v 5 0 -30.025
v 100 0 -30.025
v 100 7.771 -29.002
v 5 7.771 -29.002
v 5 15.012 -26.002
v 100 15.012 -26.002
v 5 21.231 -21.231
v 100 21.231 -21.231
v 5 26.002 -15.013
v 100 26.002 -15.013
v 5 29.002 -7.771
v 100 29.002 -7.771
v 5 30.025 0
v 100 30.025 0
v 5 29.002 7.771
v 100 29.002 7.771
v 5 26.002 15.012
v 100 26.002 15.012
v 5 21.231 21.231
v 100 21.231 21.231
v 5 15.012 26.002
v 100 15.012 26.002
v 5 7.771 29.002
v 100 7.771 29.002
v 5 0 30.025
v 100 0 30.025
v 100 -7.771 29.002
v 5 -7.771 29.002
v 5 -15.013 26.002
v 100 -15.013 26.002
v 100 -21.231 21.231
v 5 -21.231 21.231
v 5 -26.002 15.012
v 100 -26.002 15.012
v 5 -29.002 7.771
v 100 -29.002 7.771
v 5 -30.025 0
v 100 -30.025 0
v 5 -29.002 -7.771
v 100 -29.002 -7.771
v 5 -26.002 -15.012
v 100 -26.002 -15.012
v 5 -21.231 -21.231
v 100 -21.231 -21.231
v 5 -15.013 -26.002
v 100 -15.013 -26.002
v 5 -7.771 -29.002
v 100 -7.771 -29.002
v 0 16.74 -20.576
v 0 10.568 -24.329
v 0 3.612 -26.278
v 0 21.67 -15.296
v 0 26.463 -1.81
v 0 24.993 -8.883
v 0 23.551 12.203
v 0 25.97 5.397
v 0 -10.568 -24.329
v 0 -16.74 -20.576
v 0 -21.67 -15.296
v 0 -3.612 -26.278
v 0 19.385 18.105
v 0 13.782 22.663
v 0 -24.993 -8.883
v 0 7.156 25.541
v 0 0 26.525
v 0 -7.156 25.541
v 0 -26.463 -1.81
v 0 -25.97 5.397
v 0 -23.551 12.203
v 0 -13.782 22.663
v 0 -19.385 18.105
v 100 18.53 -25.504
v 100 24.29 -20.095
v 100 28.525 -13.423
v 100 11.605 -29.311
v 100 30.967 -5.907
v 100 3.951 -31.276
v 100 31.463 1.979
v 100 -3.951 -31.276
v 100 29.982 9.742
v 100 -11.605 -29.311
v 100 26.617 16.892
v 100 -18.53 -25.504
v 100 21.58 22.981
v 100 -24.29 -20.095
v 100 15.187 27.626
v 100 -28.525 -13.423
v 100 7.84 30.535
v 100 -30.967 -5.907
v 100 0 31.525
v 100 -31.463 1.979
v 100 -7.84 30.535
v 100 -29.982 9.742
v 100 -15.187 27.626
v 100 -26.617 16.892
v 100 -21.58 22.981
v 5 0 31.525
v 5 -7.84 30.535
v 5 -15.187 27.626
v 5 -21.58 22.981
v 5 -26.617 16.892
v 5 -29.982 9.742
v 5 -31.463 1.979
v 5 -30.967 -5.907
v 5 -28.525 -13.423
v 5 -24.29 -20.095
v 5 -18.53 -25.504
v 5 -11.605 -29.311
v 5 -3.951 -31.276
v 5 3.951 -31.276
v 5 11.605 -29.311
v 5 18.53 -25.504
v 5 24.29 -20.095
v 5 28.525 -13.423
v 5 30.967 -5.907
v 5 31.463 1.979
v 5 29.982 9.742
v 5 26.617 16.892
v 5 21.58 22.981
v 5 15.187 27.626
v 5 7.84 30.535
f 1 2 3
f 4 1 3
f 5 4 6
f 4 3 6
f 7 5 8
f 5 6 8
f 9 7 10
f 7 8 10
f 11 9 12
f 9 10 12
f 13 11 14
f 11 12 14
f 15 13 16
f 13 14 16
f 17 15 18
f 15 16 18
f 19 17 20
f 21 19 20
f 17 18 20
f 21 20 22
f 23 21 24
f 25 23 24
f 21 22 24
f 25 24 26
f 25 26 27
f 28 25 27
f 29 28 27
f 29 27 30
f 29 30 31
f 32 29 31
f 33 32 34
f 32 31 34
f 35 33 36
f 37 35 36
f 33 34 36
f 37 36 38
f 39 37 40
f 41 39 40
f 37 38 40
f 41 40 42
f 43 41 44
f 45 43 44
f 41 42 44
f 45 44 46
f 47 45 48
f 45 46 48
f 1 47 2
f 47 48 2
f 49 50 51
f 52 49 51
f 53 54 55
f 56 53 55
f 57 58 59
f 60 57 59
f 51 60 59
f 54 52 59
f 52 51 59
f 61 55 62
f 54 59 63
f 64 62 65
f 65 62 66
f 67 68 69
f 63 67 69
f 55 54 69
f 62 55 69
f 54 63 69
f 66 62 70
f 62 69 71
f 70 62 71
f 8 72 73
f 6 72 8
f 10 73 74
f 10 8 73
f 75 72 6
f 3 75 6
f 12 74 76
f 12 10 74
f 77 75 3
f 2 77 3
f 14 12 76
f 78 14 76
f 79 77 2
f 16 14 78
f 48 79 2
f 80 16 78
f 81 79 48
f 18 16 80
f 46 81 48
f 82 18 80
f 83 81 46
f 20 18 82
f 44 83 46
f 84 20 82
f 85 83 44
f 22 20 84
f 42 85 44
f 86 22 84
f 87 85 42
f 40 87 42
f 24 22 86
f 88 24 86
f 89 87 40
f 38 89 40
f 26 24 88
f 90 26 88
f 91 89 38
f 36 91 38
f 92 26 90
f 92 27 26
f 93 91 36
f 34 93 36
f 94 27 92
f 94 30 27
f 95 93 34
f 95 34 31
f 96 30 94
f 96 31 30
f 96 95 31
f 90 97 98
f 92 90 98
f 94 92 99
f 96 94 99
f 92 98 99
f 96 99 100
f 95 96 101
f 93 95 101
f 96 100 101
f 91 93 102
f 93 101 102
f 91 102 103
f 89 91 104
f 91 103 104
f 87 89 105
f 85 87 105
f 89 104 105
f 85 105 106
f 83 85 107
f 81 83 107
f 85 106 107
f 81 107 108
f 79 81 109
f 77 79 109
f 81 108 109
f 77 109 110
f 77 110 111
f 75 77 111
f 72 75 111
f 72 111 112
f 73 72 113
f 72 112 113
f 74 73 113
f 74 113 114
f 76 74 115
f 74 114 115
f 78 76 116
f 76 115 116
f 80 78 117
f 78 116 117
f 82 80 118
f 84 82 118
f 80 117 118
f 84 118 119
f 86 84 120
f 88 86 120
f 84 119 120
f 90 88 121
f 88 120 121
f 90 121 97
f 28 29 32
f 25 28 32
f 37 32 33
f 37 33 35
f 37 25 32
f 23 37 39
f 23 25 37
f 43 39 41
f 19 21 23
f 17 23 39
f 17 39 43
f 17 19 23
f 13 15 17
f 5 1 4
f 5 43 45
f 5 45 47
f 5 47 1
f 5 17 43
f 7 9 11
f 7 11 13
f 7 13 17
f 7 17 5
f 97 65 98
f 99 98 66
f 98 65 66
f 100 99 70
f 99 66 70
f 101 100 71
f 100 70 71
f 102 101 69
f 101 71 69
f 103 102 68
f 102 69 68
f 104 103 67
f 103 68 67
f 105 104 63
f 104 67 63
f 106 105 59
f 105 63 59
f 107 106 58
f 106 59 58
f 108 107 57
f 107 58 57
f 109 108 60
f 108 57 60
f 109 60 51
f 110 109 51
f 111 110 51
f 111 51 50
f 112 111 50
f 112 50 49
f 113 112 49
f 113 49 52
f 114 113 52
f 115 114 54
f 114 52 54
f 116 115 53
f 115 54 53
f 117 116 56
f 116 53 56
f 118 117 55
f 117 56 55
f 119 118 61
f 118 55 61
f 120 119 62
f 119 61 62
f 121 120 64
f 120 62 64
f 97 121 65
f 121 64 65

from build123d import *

# Parameters (mm, degrees)
SKETCH1_R           = 31.525
BOSS_EXTRUDE1_DEPTH = 100
SKETCH3_R           = 30.025
CUT_EXTRUDE1_DEPTH  = 95
CHAMFER2_SIZE       = 5


with BuildPart() as part:
    # Sketch1 → Boss-Extrude1 (new body)
    with BuildSketch(Plane(origin=(0, 0, 0), x_dir=(0, 0, -1), z_dir=(1, 0, 0))):
        with Locations(Location((0, 0, 0), (0, 0, 180))):
            Circle(SKETCH1_R)
    extrude(amount=BOSS_EXTRUDE1_DEPTH)

    # Sketch3 → Cut-Extrude1 (cut)
    with BuildSketch(Plane(origin=(100, 0, 0), x_dir=(0, 0, -1), z_dir=(1, 0, 0))):
        Circle(SKETCH3_R)
    extrude(amount=-CUT_EXTRUDE1_DEPTH, mode=Mode.SUBTRACT)

    # Chamfer2
    chamfer2_edges = [part.edges().sort_by_distance(p)[0] for p in [
        (0, 0, -31.525),
    ]]
    chamfer(chamfer2_edges, length=CHAMFER2_SIZE)


solid = part.part
